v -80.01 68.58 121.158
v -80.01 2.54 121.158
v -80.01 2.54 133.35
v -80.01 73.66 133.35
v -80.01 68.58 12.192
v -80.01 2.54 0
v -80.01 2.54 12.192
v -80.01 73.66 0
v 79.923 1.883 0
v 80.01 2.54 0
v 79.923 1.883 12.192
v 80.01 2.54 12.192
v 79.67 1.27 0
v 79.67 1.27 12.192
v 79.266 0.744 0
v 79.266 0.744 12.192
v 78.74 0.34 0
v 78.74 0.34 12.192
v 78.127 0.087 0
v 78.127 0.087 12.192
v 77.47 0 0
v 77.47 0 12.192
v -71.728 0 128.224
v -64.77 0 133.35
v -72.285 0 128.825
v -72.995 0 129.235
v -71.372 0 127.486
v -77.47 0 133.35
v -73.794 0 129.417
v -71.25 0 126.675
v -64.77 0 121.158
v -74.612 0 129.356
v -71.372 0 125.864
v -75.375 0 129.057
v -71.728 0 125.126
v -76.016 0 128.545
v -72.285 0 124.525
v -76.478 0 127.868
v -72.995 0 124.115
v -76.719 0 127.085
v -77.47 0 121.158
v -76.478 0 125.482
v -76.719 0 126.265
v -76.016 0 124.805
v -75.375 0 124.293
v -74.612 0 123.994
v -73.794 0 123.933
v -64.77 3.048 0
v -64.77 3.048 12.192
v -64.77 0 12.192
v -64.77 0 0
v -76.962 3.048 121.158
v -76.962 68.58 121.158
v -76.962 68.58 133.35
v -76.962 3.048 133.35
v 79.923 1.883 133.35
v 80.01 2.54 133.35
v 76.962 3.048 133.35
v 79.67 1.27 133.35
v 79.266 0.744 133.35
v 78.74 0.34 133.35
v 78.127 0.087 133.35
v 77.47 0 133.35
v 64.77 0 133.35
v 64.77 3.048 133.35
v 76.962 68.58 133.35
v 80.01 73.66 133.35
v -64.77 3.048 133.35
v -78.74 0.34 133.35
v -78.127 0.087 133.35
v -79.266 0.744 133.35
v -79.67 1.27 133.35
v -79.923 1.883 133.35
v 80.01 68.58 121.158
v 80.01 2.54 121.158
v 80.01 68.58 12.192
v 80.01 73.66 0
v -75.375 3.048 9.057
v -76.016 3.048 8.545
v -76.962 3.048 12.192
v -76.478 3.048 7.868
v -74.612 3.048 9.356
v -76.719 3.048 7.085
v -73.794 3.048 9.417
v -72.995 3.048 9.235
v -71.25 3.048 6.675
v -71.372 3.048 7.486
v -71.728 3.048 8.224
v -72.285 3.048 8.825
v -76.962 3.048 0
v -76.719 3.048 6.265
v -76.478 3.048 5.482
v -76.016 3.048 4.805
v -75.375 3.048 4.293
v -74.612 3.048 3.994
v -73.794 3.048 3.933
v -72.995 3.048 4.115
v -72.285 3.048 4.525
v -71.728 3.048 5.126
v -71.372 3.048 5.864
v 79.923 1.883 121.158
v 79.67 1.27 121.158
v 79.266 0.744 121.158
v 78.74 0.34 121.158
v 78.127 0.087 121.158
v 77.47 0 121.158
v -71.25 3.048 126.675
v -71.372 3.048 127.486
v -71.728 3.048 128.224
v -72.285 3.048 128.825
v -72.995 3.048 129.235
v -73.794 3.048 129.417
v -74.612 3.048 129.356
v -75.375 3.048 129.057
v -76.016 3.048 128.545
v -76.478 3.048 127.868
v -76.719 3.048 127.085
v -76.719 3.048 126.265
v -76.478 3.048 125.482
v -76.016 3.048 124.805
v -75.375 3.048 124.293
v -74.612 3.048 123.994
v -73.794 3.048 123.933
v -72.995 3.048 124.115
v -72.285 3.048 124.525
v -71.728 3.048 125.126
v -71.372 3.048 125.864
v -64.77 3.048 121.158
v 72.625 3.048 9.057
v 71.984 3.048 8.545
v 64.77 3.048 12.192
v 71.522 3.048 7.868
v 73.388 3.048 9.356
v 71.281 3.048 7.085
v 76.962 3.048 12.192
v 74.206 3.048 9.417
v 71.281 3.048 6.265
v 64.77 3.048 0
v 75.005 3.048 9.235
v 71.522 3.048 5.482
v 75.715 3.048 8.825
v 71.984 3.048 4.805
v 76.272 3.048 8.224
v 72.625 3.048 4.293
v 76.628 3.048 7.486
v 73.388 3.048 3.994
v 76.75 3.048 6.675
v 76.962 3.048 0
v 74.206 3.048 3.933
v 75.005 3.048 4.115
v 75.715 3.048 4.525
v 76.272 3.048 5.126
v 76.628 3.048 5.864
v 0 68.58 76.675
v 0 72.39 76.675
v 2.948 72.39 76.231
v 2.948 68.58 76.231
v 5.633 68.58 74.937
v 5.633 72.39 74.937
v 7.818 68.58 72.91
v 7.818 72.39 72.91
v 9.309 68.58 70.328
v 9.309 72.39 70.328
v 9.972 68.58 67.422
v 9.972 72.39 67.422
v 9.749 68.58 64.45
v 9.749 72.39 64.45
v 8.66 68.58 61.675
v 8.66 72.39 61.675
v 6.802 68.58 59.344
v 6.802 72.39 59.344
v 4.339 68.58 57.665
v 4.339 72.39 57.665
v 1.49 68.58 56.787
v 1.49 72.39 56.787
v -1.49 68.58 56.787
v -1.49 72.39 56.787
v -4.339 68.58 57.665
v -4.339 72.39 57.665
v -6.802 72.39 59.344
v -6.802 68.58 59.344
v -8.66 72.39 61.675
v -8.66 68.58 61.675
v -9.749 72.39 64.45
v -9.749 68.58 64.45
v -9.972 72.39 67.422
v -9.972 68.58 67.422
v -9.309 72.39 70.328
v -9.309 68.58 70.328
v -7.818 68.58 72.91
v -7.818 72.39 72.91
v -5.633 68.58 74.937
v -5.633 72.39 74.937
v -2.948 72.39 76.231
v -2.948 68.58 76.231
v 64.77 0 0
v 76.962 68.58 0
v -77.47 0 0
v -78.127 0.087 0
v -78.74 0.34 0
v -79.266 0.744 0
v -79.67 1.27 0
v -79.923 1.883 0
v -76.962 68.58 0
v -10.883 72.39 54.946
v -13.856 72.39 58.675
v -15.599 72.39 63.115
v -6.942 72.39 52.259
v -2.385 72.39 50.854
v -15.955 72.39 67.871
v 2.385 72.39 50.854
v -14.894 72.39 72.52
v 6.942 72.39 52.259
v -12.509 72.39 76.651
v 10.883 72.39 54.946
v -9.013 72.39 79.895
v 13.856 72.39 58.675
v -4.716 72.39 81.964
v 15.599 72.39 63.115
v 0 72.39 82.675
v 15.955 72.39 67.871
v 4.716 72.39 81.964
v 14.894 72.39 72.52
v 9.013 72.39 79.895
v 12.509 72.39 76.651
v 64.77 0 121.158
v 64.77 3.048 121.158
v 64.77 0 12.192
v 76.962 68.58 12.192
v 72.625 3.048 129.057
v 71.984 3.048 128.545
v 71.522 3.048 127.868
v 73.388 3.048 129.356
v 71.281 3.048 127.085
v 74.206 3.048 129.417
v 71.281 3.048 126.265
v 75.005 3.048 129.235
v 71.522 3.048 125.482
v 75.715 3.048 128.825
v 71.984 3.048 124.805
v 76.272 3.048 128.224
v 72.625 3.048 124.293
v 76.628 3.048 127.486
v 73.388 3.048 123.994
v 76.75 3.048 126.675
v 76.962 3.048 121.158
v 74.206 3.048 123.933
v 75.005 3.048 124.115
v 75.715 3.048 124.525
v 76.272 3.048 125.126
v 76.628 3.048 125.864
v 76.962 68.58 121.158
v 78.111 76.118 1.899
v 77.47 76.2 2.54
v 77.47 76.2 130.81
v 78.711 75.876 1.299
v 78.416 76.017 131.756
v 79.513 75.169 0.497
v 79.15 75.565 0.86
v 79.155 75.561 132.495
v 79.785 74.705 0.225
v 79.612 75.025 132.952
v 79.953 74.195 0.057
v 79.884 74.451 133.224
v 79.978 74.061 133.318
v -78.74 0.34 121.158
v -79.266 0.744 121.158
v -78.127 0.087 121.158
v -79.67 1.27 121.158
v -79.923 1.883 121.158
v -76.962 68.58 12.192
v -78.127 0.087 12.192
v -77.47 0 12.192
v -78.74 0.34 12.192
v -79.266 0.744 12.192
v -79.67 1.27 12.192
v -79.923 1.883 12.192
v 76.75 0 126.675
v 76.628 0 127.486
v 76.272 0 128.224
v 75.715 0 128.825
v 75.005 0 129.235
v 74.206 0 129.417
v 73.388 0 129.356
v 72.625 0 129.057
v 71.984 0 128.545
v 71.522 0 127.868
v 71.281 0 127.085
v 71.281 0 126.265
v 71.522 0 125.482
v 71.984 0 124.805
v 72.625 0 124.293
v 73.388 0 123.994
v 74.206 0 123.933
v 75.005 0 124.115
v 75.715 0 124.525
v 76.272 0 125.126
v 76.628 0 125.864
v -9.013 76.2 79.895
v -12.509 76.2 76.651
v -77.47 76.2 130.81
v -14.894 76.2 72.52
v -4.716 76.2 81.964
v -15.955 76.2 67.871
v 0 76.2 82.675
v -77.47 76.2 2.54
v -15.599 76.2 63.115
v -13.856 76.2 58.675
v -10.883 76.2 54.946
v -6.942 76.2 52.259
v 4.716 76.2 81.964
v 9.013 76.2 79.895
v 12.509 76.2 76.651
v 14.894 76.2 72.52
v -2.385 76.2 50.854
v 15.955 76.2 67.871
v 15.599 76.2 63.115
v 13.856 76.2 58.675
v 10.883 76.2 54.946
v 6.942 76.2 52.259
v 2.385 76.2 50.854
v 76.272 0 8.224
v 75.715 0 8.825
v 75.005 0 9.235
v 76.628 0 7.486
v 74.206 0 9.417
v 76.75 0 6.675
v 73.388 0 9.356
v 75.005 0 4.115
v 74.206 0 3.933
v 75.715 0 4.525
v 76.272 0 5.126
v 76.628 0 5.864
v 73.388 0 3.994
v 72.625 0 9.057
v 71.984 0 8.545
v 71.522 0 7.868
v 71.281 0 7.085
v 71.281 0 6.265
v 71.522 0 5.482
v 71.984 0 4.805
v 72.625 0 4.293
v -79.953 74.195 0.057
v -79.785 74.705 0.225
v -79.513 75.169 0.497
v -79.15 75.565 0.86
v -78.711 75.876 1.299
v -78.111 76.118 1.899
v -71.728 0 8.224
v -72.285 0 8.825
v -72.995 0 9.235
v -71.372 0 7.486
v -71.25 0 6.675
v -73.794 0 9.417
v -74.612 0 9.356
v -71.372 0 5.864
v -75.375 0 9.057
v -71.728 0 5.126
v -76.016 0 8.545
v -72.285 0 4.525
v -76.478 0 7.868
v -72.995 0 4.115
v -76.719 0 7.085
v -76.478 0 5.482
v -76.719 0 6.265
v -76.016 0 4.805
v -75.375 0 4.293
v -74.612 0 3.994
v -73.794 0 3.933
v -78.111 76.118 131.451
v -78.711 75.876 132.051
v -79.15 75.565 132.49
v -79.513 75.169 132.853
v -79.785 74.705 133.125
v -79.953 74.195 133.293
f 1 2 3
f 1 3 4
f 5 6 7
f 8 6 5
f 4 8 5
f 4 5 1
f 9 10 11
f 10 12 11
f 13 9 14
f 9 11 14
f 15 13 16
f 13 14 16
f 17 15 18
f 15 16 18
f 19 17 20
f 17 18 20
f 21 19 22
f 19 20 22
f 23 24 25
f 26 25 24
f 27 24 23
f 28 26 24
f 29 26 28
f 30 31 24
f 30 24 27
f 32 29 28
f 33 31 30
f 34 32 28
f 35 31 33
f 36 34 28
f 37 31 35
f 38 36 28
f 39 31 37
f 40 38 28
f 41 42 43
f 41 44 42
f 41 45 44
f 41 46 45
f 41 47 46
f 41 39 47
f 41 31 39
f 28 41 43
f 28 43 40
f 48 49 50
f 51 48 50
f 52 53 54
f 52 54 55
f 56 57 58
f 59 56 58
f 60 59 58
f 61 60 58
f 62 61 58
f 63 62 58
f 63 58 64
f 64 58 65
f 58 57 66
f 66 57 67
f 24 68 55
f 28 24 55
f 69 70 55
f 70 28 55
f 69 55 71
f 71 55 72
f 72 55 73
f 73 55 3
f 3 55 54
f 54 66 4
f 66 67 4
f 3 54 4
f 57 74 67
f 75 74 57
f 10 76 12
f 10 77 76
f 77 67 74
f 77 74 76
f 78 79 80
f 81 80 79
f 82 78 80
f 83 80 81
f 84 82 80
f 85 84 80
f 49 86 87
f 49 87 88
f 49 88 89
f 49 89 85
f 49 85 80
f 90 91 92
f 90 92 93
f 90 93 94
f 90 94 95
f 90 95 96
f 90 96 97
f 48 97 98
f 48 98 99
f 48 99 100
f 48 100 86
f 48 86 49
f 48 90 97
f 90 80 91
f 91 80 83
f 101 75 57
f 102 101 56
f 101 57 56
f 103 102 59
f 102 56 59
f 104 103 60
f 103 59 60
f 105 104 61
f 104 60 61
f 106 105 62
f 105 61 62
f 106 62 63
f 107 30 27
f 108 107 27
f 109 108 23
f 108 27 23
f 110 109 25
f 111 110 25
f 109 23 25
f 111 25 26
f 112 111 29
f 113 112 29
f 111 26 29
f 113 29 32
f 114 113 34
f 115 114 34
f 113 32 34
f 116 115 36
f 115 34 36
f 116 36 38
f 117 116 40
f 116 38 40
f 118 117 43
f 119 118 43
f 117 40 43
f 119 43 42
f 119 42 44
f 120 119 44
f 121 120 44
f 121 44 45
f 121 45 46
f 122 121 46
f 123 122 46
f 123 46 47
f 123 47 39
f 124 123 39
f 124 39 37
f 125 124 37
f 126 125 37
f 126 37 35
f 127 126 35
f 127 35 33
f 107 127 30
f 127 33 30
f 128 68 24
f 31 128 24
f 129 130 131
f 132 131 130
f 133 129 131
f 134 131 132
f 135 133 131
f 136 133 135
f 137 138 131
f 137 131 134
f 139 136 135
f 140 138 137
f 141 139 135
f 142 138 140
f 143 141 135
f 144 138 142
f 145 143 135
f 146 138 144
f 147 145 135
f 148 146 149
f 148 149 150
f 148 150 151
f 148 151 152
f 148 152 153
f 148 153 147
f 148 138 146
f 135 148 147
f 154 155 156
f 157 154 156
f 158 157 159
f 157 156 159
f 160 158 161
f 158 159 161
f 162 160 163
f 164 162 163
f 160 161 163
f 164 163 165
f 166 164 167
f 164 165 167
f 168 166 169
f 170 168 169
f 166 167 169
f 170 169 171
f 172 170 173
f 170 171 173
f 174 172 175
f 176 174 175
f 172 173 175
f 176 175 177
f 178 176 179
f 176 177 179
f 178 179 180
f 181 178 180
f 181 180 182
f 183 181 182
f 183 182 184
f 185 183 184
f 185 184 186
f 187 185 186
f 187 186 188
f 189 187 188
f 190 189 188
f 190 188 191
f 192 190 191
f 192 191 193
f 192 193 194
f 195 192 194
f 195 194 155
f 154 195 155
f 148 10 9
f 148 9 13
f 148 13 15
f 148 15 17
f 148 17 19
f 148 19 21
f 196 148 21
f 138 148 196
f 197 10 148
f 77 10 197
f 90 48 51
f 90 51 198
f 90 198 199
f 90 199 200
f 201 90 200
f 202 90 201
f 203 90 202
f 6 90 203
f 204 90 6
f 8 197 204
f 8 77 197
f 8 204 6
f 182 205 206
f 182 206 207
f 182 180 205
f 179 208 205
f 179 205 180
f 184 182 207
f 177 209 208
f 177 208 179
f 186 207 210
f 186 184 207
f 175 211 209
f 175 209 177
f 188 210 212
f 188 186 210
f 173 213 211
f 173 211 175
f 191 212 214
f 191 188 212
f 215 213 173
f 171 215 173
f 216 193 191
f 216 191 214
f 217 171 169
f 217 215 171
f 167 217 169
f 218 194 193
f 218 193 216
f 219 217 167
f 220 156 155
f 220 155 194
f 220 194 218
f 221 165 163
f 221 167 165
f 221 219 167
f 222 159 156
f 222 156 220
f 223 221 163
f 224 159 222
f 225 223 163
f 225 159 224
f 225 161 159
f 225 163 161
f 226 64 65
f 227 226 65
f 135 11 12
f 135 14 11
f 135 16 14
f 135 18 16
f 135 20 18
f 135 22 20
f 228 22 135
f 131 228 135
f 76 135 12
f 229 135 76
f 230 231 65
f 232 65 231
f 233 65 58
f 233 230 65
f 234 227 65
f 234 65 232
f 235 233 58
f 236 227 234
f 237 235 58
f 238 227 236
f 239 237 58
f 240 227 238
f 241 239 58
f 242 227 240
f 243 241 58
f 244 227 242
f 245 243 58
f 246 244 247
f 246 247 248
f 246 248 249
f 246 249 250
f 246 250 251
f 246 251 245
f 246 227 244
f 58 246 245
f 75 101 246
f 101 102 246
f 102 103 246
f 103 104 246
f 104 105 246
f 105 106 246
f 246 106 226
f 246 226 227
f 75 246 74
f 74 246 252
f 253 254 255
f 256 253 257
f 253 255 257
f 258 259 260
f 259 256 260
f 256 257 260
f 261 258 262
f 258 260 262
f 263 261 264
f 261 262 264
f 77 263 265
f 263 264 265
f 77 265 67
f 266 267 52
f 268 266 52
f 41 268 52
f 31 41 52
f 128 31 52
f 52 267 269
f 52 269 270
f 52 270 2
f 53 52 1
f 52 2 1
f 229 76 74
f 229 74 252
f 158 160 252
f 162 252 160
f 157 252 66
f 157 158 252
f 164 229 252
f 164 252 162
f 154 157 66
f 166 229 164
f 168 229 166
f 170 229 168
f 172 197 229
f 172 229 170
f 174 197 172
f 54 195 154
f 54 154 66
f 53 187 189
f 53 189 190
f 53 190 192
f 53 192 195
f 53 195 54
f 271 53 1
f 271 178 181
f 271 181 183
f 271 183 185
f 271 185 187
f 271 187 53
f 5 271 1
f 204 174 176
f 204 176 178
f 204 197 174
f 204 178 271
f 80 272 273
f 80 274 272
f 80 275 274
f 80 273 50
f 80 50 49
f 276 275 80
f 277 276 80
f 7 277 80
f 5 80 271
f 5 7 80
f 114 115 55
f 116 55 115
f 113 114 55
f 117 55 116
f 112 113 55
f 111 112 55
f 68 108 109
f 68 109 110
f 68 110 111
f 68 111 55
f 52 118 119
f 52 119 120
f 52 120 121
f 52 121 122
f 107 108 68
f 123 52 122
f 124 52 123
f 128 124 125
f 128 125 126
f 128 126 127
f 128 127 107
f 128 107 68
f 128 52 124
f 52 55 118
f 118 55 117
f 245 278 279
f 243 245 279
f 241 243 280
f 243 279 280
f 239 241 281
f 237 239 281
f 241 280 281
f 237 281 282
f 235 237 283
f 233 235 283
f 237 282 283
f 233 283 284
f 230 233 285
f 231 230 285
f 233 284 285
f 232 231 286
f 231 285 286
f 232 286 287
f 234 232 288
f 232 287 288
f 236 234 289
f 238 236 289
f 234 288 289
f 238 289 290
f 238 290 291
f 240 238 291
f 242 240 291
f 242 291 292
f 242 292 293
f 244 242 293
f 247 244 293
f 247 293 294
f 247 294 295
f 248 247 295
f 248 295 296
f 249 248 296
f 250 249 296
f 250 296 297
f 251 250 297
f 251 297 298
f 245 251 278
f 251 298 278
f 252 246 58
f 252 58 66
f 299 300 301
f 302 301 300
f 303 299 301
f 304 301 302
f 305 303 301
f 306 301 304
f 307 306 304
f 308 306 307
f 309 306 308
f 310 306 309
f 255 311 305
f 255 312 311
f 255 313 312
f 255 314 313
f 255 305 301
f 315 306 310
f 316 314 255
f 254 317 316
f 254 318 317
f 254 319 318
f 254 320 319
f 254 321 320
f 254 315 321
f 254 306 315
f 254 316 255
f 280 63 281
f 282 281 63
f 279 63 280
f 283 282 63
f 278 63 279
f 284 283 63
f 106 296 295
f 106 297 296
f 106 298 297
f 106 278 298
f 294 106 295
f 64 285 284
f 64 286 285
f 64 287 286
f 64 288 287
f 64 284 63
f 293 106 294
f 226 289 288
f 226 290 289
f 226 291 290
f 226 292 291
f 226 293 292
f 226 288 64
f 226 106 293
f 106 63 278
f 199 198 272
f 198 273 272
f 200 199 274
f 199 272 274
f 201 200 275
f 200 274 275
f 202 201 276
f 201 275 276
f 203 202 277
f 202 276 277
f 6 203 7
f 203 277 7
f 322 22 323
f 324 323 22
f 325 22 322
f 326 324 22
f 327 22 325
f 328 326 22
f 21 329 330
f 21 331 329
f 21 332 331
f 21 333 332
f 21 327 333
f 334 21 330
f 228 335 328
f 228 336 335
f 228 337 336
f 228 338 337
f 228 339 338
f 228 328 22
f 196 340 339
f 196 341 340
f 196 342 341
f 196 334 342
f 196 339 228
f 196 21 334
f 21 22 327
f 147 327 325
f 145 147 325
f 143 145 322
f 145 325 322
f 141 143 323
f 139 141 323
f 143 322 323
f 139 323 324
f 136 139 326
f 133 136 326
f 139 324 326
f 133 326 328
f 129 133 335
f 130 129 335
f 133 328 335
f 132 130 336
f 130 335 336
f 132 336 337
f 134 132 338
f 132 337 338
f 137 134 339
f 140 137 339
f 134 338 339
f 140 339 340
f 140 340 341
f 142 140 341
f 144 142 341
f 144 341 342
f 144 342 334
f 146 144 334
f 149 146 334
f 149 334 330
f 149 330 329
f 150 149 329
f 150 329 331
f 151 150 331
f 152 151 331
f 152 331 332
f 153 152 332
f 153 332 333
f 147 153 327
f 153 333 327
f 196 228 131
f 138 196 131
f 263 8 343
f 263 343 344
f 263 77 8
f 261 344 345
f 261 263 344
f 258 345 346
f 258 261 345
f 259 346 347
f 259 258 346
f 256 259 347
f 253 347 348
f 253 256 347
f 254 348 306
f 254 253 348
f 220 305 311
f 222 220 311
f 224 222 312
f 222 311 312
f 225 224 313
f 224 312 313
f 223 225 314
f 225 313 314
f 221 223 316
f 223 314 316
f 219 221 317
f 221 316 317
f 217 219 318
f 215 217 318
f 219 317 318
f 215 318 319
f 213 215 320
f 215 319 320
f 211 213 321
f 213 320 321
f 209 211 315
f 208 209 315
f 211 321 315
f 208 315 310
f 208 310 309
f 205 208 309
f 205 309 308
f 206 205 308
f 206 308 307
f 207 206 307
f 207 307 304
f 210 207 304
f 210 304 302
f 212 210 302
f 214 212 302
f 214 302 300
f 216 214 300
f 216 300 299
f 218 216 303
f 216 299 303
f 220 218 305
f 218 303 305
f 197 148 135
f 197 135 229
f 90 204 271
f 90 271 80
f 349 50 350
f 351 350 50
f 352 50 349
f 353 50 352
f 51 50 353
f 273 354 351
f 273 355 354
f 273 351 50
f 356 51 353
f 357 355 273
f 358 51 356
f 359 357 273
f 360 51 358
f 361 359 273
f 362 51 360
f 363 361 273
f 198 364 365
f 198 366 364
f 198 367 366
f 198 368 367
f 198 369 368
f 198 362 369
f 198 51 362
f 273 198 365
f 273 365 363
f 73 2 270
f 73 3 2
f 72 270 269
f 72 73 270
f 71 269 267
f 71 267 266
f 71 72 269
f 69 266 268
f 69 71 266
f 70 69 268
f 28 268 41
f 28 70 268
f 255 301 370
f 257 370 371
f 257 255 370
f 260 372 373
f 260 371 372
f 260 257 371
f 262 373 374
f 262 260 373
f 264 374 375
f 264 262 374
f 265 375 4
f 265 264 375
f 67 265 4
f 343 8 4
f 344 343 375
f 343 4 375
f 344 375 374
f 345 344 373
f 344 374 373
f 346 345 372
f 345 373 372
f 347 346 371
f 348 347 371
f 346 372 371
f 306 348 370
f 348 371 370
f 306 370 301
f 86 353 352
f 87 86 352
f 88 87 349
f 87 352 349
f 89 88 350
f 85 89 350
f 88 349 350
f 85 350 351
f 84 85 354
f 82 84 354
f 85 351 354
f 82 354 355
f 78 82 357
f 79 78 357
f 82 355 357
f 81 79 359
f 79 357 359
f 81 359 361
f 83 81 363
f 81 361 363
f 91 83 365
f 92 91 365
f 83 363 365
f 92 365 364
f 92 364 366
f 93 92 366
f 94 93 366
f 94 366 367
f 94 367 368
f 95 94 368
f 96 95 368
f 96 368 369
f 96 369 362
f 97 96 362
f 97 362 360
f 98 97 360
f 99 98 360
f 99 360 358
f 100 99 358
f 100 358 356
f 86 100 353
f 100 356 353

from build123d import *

# Parameters (mm, degrees)
BOSS_EXTRU_1_DEPTH      = 133.35
ESQUISSE3_W             = 108.966
ESQUISSE3_H             = 68.58
ENL_V_MAT_EXTRU_1_DEPTH = 222.799600766
CONG_1_R                = 2.54
CONG_2_R                = 2.54
ESQUISSE6_R             = 10
ENL_V_MAT_EXTRU_4_DEPTH = 174.176969023
ESQUISSE9_R             = 16
ENL_V_MAT_EXTRU_5_DEPTH = 3.81
SKETCH1_R               = 2.75
CUT_EXTRUDE1_DEPTH      = 3.048


with BuildPart() as part:
    # Esquisse2 → Boss.-Extru.1 (new body)
    with BuildSketch(Plane.XY):
        Polygon((-64.77, 0), (-80.01, 0), (-80.01, 76.2), (80.01, 76.2), (80.01, 0), (64.77, 0), (64.77, 3.048), (76.962, 3.048), (76.962, 68.58), (-76.962, 68.58), (-76.962, 3.048), (-64.77, 3.048), align=None)
    extrude(amount=BOSS_EXTRU_1_DEPTH)

    # Esquisse3 → Enlèv. mat.-Extru.1 (cut, through all)
    with BuildSketch(Plane.ZY.offset(80.01)):
        with Locations((66.675, 34.29)):
            Rectangle(ESQUISSE3_W, ESQUISSE3_H)
    extrude(amount=-ENL_V_MAT_EXTRU_1_DEPTH, mode=Mode.SUBTRACT)

    # Congé1
    cong_1_edges = [part.edges().sort_by_distance(p)[0] for p in [
        (-80.01, 0, 127.254),
        (80.01, 0, 127.254),
        (-80.01, 0, 6.096),
        (80.01, 0, 6.096),
    ]]
    fillet(cong_1_edges, radius=CONG_1_R)

    # Congé2
    cong_2_edges = [part.edges().sort_by_distance(p)[0] for p in [
        (0, 76.2, 0),
        (-80.01, 76.2, 66.675),
        (80.01, 76.2, 66.675),
        (0, 76.2, 133.35),
    ]]
    fillet(cong_2_edges, radius=CONG_2_R)

    # Esquisse6 → Enlèv. mat.-Extru.4 (cut, through all)
    with BuildSketch(Plane(origin=(0, 76.2, 0), x_dir=(1, 0, 0), z_dir=(0, 1, 0))):
        with Locations(Location((0, -66.675, 0), (0, 0, 270))):
            Circle(ESQUISSE6_R)
    extrude(amount=-ENL_V_MAT_EXTRU_4_DEPTH, mode=Mode.SUBTRACT)

    # Esquisse9 → Enlèv. mat.-Extru.5 (cut)
    with BuildSketch(Plane(origin=(0, 76.2, 0), x_dir=(1, 0, 0), z_dir=(0, 1, 0))):
        with Locations(Location((0, -66.675, 0), (0, 0, 270))):
            Circle(ESQUISSE9_R)
    extrude(amount=-ENL_V_MAT_EXTRU_5_DEPTH, mode=Mode.SUBTRACT)

    # Sketch1 → Cut-Extrude1 (cut)
    with BuildSketch(Plane.XZ):
        with Locations((74, 126.675)):
            Circle(SKETCH1_R)
        with Locations((74, 6.675)):
            Circle(SKETCH1_R)
        with Locations((-74, 6.675)):
            Circle(SKETCH1_R)
        with Locations((-74, 126.675)):
            Circle(SKETCH1_R)
    extrude(amount=-CUT_EXTRUDE1_DEPTH, mode=Mode.SUBTRACT)


solid = part.part
